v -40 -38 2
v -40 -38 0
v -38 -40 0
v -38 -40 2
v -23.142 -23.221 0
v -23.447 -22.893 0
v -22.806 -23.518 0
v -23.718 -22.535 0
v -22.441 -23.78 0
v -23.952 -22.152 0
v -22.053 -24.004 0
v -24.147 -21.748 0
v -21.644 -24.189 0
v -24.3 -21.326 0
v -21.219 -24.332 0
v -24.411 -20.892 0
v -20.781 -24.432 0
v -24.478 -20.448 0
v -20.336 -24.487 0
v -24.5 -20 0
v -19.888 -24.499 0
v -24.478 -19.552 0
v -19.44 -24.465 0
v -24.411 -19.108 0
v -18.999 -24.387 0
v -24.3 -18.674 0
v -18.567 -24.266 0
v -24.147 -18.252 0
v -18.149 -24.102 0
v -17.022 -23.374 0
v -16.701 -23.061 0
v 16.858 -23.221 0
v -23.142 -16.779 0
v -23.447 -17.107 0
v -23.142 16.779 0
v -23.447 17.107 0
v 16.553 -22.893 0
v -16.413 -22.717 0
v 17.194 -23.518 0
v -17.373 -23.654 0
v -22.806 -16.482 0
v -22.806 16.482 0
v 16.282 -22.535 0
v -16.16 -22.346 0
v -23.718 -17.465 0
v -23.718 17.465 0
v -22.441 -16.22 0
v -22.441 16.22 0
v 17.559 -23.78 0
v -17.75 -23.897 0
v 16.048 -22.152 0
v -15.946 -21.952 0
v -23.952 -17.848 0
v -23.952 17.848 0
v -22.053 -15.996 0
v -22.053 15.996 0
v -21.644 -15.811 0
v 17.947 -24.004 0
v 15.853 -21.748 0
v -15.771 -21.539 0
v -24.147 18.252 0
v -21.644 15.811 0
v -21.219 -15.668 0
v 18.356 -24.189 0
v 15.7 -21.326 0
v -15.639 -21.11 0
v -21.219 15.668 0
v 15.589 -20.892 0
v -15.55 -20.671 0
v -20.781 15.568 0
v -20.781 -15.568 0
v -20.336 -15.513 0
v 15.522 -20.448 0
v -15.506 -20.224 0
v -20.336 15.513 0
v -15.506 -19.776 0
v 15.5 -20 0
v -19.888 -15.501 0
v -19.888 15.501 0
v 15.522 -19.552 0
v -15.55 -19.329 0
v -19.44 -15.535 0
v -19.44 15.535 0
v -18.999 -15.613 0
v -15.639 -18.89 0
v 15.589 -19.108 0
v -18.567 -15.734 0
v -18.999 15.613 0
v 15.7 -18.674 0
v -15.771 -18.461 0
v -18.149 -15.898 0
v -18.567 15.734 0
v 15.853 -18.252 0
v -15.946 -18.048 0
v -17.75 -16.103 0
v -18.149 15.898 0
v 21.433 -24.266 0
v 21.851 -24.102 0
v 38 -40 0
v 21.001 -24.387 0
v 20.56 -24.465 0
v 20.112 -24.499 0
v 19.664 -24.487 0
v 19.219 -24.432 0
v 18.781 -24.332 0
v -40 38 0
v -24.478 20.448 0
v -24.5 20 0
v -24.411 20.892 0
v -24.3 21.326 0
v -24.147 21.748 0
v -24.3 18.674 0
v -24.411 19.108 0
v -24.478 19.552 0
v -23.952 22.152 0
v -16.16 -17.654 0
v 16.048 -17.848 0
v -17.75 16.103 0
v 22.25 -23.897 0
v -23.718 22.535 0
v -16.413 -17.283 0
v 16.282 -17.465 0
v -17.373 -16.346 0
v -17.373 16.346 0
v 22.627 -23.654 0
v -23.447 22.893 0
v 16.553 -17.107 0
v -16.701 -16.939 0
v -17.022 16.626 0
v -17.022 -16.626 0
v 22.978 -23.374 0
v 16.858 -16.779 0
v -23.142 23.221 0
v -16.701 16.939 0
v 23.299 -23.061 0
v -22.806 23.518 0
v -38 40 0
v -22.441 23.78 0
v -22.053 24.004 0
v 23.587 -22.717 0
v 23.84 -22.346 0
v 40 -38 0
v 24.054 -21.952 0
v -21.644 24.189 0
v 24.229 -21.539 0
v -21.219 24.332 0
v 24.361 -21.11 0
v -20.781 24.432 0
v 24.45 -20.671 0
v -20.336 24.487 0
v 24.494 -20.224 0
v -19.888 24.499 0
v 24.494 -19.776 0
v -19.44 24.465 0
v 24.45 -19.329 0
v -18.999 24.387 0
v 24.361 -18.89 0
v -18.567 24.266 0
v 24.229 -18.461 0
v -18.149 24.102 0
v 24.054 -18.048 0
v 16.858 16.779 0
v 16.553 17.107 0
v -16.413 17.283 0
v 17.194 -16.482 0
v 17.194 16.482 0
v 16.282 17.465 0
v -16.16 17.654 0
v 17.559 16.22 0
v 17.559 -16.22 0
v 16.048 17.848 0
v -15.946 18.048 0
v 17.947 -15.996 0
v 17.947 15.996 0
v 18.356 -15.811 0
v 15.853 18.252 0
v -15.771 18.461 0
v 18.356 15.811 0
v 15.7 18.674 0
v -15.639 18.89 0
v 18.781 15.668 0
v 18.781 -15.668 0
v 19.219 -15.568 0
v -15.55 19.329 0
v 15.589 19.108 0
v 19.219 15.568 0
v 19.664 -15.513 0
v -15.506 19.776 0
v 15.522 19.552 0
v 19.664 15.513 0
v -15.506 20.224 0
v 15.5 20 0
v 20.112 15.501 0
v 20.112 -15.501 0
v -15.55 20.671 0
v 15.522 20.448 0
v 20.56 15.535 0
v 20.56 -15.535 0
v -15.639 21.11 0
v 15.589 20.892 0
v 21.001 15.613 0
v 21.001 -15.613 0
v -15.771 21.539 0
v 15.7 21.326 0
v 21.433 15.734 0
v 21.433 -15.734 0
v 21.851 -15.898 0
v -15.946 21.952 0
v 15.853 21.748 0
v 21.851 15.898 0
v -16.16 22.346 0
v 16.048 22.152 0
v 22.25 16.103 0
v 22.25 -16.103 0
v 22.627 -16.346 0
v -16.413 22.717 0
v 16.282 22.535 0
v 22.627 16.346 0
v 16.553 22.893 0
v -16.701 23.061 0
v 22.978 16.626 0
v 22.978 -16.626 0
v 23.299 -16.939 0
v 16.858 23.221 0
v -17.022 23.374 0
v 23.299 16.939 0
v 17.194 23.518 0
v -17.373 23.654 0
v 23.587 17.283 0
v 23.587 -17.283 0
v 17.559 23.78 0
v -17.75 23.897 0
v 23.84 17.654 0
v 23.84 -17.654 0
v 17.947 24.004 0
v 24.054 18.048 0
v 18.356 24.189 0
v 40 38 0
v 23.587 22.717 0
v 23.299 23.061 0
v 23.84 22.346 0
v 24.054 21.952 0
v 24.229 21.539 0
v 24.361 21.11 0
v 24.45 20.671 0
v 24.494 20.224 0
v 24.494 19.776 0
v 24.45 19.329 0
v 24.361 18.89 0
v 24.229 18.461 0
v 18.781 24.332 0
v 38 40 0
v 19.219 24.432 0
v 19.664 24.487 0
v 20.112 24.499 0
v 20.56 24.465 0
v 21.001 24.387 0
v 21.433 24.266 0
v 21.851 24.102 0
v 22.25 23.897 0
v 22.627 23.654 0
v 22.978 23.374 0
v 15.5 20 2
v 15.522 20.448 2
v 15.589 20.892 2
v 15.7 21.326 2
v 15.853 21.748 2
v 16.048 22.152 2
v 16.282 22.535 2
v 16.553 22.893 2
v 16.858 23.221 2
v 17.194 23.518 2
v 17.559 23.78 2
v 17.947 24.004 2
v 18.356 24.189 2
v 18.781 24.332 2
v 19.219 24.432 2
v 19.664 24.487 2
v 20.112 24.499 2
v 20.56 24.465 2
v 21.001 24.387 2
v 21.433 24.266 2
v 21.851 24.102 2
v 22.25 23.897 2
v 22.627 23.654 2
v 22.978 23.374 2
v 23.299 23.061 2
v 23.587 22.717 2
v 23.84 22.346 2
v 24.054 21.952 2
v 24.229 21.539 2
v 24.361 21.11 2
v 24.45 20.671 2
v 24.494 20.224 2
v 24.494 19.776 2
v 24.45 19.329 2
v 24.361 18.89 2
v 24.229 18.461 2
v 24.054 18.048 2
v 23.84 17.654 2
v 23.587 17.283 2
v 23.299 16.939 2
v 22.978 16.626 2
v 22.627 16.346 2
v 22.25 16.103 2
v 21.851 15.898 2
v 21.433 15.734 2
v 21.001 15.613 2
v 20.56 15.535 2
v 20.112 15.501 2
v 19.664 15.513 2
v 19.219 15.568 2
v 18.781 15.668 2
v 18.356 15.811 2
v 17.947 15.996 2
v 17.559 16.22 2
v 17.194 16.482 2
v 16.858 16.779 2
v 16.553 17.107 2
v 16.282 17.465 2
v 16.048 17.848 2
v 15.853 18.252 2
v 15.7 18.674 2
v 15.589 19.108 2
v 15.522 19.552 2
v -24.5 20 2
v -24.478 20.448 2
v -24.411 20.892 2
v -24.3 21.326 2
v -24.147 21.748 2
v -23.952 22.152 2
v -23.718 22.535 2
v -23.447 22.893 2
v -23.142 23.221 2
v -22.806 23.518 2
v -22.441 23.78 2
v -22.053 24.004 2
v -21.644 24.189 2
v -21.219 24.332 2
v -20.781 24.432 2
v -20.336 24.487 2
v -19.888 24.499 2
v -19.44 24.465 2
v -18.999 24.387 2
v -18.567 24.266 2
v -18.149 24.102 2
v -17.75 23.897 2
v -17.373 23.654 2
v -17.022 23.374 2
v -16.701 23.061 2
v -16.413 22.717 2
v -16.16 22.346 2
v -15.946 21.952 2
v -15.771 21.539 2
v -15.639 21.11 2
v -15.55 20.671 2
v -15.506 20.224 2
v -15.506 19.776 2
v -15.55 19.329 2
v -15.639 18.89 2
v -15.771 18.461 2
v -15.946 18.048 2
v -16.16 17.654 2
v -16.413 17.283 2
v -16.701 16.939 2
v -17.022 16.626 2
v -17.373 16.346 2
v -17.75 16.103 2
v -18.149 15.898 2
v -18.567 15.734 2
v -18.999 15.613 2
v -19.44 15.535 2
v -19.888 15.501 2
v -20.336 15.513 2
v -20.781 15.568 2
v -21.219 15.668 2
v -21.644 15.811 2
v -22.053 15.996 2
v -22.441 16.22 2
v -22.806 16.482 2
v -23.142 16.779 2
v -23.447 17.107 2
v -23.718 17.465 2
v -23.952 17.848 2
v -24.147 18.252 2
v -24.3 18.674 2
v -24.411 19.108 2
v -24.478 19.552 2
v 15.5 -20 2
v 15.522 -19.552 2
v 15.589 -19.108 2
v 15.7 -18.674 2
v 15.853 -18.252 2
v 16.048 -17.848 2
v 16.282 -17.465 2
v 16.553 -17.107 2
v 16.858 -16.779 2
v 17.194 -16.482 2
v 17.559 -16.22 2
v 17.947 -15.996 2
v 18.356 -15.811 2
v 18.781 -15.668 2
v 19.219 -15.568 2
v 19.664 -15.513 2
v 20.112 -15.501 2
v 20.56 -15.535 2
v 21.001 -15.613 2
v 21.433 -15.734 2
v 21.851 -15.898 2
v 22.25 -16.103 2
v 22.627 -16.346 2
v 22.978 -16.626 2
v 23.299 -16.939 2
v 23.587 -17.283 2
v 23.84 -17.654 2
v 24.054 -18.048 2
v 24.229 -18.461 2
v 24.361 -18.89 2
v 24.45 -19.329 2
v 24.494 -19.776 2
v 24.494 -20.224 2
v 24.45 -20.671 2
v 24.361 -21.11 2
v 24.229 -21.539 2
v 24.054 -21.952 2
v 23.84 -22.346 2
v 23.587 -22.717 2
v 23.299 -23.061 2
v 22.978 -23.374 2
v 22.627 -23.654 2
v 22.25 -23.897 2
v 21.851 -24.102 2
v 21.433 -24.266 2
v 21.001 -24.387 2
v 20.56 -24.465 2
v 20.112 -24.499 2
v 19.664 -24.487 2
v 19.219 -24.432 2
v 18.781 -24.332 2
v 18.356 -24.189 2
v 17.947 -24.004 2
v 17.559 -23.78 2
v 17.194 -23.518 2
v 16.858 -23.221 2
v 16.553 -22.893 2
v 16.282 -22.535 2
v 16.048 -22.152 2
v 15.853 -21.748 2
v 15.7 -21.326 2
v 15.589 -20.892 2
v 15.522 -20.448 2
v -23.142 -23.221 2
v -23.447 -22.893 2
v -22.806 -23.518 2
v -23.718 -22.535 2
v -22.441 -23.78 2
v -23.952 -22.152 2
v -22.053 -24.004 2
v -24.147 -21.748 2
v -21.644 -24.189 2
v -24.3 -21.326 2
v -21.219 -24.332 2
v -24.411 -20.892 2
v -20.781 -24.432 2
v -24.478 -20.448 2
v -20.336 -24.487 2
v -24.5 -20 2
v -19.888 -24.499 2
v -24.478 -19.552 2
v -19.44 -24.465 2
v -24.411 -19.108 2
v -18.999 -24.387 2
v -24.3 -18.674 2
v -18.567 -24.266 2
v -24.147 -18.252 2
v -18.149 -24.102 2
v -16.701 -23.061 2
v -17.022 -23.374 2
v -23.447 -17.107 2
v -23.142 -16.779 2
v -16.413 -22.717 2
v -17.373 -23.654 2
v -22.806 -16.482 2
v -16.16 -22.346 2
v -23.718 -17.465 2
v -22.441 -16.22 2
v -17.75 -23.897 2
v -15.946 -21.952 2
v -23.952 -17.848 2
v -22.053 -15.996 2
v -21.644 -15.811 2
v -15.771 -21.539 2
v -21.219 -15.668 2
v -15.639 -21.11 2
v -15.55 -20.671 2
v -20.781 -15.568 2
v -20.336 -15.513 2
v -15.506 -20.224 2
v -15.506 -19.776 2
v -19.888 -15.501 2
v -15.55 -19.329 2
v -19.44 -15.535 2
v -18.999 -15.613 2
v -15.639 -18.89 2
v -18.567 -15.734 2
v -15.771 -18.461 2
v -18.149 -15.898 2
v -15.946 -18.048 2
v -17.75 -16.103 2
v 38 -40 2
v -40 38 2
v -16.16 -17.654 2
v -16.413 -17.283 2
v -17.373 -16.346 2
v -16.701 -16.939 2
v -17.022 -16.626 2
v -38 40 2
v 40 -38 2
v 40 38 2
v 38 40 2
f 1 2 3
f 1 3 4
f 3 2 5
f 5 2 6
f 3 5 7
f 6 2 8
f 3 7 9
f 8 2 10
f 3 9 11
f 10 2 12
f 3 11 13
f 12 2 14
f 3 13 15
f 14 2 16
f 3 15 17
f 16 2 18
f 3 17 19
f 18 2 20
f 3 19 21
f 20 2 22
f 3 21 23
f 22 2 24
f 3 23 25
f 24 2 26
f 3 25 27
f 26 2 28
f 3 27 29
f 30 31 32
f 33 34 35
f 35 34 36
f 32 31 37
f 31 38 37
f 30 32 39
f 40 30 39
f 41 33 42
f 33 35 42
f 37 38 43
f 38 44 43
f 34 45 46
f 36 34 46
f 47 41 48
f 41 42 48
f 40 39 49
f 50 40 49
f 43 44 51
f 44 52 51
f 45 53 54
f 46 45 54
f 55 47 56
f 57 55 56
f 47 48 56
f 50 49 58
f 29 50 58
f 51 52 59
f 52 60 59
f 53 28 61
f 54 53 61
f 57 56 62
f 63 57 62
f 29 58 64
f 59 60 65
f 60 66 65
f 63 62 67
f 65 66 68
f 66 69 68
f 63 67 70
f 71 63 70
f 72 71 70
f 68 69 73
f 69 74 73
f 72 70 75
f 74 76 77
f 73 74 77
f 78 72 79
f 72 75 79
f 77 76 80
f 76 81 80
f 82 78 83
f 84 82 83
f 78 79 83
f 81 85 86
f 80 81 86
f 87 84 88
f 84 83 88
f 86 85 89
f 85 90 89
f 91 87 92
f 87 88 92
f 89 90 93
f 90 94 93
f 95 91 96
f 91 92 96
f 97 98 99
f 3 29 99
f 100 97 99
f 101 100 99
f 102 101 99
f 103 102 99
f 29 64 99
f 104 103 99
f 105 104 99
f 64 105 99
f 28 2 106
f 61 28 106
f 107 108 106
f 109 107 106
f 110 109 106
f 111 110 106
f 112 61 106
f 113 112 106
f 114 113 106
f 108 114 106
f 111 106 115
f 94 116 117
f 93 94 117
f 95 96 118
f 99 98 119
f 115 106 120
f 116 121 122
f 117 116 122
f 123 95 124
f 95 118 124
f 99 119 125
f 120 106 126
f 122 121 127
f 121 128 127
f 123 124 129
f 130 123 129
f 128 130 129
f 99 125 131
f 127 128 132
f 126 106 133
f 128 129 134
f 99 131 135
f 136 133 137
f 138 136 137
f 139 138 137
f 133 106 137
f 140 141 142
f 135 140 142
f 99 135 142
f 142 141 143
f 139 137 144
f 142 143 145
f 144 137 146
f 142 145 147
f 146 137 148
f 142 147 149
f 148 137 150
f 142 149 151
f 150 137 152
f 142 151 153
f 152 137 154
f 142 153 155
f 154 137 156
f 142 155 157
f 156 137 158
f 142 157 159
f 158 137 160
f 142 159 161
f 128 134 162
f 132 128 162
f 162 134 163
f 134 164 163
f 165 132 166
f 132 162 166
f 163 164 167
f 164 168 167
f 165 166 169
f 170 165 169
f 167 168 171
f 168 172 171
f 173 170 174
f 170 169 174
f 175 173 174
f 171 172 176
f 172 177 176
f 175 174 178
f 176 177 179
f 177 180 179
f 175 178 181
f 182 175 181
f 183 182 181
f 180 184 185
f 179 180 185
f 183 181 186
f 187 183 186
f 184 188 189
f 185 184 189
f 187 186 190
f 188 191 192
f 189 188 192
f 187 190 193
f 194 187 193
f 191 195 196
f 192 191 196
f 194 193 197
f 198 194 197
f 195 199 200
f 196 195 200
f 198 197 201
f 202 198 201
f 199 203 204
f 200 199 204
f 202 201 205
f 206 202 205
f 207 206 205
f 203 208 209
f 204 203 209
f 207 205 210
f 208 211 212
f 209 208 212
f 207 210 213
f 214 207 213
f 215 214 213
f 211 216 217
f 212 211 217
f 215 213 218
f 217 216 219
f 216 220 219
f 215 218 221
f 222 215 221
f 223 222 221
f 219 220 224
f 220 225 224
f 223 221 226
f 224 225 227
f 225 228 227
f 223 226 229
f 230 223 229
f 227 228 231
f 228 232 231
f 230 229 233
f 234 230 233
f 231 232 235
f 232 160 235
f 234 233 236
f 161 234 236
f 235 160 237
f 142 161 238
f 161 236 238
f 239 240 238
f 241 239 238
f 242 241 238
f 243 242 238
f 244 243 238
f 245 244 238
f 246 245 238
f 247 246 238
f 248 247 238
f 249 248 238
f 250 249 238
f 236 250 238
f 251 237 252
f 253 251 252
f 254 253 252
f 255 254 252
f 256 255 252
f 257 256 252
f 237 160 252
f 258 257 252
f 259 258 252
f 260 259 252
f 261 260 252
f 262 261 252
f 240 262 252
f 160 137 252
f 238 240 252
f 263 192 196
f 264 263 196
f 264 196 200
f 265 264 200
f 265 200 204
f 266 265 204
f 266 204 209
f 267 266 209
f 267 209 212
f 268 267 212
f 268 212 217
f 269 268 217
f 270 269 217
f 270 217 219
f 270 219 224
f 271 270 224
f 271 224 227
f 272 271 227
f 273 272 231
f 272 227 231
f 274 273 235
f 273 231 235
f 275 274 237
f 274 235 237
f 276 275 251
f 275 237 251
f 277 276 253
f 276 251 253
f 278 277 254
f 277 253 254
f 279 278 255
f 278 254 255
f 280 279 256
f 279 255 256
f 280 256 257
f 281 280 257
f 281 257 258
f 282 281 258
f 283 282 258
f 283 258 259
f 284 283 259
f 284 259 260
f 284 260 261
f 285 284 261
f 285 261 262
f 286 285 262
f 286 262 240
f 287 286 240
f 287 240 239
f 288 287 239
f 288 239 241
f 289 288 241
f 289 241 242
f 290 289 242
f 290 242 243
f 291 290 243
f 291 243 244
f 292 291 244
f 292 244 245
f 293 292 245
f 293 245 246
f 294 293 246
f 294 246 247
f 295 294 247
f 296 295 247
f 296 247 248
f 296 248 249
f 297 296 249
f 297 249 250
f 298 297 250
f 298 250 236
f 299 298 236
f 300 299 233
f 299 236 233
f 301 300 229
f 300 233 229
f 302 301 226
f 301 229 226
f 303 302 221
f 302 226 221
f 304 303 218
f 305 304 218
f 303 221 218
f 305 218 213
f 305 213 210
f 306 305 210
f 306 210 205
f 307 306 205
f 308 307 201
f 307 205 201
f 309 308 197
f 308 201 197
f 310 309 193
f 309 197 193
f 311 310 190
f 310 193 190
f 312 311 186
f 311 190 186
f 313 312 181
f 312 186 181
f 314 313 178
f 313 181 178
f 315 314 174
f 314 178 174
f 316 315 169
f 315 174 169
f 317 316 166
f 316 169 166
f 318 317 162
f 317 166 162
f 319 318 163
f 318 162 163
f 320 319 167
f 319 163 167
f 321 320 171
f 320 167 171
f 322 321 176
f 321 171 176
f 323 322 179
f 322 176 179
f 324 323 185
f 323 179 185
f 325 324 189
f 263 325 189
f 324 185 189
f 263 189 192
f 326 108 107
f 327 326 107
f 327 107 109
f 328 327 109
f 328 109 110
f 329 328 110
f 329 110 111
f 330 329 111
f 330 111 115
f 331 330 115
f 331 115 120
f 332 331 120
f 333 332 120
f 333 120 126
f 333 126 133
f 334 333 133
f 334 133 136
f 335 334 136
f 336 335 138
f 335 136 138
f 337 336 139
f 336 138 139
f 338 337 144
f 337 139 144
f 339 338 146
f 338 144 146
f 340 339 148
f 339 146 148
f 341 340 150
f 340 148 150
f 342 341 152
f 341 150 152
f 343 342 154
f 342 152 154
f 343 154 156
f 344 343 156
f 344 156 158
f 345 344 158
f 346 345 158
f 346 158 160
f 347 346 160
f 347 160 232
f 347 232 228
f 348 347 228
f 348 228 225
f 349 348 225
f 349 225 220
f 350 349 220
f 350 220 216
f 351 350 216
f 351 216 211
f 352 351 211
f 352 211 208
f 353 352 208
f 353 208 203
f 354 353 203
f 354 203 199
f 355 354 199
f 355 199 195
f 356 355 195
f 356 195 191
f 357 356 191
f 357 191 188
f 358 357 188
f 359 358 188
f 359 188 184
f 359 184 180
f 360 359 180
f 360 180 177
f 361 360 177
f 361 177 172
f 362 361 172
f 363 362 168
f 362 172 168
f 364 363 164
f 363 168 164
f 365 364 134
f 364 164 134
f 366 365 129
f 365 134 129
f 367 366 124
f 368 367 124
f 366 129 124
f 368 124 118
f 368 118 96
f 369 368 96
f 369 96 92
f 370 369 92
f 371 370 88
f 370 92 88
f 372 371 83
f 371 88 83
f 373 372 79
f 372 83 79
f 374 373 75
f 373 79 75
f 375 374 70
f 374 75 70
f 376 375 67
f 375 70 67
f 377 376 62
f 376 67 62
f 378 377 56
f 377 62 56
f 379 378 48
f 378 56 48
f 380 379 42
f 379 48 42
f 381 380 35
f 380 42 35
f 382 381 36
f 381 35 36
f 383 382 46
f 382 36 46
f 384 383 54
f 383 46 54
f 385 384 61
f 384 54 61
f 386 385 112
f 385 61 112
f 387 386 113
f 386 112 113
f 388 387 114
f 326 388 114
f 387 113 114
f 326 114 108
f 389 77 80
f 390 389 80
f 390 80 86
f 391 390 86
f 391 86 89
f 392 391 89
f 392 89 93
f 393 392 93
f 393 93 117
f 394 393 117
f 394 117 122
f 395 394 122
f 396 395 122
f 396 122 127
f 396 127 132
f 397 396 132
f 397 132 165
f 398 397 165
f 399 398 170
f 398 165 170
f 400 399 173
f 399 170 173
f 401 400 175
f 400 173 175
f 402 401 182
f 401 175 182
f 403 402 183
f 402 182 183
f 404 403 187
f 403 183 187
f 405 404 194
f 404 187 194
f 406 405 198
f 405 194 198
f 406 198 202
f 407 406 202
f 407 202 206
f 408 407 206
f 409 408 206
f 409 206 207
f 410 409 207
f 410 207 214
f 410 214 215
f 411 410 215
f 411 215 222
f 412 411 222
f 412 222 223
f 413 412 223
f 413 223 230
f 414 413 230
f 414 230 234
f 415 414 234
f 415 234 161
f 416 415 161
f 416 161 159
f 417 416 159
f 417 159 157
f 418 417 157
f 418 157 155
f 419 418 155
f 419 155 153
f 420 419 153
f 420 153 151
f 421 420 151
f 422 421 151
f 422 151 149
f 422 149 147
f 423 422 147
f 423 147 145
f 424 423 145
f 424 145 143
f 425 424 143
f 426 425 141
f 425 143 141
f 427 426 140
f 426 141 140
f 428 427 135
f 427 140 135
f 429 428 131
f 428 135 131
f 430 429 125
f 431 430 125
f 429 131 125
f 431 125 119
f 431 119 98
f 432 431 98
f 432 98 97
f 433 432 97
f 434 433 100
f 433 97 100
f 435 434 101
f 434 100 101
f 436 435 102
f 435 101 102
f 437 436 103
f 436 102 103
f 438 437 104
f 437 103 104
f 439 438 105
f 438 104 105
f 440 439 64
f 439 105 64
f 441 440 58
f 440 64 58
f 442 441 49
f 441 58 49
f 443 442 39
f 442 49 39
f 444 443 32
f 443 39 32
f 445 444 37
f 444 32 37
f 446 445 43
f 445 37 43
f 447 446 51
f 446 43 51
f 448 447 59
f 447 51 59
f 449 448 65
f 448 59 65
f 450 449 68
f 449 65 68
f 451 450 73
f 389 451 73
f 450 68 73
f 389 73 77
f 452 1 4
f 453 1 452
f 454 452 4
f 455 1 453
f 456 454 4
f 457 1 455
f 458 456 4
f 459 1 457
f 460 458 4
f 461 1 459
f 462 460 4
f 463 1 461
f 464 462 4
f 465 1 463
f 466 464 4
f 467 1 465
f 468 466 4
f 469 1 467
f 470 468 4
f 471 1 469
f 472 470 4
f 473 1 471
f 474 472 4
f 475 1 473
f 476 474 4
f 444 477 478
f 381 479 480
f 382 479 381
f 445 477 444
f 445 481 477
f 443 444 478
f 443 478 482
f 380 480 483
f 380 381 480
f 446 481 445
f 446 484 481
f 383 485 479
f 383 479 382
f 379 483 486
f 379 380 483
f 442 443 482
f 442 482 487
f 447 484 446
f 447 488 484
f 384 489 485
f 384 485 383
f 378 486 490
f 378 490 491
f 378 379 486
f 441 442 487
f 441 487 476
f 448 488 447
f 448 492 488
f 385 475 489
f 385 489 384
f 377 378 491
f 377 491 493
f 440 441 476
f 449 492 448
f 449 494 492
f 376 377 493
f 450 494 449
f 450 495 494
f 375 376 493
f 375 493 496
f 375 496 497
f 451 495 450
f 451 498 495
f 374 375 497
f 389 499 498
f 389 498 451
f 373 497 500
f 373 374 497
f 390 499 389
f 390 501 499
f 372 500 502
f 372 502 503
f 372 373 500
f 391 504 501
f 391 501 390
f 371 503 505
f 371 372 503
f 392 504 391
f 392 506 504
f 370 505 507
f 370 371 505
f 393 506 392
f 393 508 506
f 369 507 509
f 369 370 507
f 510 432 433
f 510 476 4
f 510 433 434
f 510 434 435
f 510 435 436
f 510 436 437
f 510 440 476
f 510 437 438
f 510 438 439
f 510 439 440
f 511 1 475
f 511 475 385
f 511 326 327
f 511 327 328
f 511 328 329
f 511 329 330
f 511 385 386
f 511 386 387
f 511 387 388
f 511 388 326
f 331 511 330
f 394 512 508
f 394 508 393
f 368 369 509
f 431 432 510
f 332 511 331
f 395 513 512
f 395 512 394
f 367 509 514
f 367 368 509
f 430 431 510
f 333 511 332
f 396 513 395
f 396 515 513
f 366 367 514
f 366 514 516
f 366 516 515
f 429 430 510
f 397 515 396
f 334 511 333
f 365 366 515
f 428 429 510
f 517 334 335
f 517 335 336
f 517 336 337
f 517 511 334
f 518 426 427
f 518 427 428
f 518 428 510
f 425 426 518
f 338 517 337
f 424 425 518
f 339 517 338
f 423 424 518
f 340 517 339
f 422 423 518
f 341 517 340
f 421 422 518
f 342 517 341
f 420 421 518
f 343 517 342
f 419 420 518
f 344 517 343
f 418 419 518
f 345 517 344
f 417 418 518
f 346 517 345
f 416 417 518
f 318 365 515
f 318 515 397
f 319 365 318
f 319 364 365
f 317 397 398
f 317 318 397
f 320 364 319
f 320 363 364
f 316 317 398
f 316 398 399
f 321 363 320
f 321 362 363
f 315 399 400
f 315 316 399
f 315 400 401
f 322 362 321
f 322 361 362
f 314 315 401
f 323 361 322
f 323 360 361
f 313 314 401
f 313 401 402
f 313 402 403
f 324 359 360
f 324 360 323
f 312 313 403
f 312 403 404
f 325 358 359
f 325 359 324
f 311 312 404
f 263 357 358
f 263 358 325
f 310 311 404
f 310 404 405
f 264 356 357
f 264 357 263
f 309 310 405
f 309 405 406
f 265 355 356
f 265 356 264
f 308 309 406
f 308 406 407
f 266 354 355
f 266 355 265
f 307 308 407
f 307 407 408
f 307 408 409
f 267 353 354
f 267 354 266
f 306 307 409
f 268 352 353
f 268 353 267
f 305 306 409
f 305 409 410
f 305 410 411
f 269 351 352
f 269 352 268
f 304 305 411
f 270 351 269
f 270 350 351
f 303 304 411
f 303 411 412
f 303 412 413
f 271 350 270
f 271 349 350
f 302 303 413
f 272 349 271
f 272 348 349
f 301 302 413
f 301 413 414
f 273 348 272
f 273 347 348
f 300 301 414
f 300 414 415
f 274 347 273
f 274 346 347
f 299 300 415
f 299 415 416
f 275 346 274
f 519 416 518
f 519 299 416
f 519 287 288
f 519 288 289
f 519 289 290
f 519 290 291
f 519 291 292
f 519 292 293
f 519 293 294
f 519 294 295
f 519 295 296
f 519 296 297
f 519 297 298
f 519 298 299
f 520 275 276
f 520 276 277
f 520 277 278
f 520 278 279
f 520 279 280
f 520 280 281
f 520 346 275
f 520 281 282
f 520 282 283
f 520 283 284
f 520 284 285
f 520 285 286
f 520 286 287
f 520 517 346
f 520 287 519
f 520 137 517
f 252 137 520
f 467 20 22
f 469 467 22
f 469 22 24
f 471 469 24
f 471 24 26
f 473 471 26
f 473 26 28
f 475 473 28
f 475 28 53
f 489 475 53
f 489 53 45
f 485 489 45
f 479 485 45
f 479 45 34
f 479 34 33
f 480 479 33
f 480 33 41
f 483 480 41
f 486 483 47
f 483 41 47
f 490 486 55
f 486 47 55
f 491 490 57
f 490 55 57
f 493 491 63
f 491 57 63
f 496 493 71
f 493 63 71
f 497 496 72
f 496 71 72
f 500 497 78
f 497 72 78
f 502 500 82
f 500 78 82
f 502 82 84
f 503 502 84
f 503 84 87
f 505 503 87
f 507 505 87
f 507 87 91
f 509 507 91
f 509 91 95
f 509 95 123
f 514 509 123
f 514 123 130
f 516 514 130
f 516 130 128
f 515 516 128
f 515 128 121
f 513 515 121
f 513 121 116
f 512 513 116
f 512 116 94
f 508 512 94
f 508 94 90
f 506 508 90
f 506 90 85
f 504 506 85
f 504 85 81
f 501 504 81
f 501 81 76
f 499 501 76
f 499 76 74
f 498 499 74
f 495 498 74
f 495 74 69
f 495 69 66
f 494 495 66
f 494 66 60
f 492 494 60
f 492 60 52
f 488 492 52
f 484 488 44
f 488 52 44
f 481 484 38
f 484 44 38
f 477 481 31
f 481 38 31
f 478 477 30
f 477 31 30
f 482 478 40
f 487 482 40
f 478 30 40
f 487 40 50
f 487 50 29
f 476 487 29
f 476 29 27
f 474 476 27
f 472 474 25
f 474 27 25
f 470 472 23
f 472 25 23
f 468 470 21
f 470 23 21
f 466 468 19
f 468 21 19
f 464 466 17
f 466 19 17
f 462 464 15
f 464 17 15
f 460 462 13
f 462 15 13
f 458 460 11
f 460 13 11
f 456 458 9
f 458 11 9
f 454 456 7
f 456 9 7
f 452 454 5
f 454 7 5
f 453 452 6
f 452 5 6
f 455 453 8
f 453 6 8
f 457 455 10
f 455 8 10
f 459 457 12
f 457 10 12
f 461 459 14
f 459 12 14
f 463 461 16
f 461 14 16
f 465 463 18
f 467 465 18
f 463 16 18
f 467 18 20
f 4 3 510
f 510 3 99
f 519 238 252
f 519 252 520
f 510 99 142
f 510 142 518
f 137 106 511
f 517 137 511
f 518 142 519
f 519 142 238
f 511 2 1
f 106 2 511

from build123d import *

# Parameters (mm, degrees)
SKETCH_1_W        = 80
SKETCH_1_H        = 80
EXTRUDE_1_DEPTH   = 2
CHAMFER_1_SIZE    = 2
HOLE_WIZARD_M81_D = 9


with BuildPart() as part:
    # Эскиз1 → Бобышка-Вытянуть1 (new body)
    with BuildSketch(Plane.XY):
        Rectangle(SKETCH_1_W, SKETCH_1_H)
    extrude(amount=EXTRUDE_1_DEPTH)

    # Фаска1
    chamfer_1_edges = [part.edges().sort_by_distance(p)[0] for p in [
        (40, -40, 1),
        (-40, -40, 1),
        (-40, 40, 1),
        (40, 40, 1),
    ]]
    chamfer(chamfer_1_edges, length=CHAMFER_1_SIZE)

    # Отверстие с зазором M81 (through all)
    with Locations(Plane.XY.offset(2)):
        with Locations((-20, 20), (20, 20), (-20, -20), (20, -20)):
            Hole(HOLE_WIZARD_M81_D / 2)


solid = part.part
